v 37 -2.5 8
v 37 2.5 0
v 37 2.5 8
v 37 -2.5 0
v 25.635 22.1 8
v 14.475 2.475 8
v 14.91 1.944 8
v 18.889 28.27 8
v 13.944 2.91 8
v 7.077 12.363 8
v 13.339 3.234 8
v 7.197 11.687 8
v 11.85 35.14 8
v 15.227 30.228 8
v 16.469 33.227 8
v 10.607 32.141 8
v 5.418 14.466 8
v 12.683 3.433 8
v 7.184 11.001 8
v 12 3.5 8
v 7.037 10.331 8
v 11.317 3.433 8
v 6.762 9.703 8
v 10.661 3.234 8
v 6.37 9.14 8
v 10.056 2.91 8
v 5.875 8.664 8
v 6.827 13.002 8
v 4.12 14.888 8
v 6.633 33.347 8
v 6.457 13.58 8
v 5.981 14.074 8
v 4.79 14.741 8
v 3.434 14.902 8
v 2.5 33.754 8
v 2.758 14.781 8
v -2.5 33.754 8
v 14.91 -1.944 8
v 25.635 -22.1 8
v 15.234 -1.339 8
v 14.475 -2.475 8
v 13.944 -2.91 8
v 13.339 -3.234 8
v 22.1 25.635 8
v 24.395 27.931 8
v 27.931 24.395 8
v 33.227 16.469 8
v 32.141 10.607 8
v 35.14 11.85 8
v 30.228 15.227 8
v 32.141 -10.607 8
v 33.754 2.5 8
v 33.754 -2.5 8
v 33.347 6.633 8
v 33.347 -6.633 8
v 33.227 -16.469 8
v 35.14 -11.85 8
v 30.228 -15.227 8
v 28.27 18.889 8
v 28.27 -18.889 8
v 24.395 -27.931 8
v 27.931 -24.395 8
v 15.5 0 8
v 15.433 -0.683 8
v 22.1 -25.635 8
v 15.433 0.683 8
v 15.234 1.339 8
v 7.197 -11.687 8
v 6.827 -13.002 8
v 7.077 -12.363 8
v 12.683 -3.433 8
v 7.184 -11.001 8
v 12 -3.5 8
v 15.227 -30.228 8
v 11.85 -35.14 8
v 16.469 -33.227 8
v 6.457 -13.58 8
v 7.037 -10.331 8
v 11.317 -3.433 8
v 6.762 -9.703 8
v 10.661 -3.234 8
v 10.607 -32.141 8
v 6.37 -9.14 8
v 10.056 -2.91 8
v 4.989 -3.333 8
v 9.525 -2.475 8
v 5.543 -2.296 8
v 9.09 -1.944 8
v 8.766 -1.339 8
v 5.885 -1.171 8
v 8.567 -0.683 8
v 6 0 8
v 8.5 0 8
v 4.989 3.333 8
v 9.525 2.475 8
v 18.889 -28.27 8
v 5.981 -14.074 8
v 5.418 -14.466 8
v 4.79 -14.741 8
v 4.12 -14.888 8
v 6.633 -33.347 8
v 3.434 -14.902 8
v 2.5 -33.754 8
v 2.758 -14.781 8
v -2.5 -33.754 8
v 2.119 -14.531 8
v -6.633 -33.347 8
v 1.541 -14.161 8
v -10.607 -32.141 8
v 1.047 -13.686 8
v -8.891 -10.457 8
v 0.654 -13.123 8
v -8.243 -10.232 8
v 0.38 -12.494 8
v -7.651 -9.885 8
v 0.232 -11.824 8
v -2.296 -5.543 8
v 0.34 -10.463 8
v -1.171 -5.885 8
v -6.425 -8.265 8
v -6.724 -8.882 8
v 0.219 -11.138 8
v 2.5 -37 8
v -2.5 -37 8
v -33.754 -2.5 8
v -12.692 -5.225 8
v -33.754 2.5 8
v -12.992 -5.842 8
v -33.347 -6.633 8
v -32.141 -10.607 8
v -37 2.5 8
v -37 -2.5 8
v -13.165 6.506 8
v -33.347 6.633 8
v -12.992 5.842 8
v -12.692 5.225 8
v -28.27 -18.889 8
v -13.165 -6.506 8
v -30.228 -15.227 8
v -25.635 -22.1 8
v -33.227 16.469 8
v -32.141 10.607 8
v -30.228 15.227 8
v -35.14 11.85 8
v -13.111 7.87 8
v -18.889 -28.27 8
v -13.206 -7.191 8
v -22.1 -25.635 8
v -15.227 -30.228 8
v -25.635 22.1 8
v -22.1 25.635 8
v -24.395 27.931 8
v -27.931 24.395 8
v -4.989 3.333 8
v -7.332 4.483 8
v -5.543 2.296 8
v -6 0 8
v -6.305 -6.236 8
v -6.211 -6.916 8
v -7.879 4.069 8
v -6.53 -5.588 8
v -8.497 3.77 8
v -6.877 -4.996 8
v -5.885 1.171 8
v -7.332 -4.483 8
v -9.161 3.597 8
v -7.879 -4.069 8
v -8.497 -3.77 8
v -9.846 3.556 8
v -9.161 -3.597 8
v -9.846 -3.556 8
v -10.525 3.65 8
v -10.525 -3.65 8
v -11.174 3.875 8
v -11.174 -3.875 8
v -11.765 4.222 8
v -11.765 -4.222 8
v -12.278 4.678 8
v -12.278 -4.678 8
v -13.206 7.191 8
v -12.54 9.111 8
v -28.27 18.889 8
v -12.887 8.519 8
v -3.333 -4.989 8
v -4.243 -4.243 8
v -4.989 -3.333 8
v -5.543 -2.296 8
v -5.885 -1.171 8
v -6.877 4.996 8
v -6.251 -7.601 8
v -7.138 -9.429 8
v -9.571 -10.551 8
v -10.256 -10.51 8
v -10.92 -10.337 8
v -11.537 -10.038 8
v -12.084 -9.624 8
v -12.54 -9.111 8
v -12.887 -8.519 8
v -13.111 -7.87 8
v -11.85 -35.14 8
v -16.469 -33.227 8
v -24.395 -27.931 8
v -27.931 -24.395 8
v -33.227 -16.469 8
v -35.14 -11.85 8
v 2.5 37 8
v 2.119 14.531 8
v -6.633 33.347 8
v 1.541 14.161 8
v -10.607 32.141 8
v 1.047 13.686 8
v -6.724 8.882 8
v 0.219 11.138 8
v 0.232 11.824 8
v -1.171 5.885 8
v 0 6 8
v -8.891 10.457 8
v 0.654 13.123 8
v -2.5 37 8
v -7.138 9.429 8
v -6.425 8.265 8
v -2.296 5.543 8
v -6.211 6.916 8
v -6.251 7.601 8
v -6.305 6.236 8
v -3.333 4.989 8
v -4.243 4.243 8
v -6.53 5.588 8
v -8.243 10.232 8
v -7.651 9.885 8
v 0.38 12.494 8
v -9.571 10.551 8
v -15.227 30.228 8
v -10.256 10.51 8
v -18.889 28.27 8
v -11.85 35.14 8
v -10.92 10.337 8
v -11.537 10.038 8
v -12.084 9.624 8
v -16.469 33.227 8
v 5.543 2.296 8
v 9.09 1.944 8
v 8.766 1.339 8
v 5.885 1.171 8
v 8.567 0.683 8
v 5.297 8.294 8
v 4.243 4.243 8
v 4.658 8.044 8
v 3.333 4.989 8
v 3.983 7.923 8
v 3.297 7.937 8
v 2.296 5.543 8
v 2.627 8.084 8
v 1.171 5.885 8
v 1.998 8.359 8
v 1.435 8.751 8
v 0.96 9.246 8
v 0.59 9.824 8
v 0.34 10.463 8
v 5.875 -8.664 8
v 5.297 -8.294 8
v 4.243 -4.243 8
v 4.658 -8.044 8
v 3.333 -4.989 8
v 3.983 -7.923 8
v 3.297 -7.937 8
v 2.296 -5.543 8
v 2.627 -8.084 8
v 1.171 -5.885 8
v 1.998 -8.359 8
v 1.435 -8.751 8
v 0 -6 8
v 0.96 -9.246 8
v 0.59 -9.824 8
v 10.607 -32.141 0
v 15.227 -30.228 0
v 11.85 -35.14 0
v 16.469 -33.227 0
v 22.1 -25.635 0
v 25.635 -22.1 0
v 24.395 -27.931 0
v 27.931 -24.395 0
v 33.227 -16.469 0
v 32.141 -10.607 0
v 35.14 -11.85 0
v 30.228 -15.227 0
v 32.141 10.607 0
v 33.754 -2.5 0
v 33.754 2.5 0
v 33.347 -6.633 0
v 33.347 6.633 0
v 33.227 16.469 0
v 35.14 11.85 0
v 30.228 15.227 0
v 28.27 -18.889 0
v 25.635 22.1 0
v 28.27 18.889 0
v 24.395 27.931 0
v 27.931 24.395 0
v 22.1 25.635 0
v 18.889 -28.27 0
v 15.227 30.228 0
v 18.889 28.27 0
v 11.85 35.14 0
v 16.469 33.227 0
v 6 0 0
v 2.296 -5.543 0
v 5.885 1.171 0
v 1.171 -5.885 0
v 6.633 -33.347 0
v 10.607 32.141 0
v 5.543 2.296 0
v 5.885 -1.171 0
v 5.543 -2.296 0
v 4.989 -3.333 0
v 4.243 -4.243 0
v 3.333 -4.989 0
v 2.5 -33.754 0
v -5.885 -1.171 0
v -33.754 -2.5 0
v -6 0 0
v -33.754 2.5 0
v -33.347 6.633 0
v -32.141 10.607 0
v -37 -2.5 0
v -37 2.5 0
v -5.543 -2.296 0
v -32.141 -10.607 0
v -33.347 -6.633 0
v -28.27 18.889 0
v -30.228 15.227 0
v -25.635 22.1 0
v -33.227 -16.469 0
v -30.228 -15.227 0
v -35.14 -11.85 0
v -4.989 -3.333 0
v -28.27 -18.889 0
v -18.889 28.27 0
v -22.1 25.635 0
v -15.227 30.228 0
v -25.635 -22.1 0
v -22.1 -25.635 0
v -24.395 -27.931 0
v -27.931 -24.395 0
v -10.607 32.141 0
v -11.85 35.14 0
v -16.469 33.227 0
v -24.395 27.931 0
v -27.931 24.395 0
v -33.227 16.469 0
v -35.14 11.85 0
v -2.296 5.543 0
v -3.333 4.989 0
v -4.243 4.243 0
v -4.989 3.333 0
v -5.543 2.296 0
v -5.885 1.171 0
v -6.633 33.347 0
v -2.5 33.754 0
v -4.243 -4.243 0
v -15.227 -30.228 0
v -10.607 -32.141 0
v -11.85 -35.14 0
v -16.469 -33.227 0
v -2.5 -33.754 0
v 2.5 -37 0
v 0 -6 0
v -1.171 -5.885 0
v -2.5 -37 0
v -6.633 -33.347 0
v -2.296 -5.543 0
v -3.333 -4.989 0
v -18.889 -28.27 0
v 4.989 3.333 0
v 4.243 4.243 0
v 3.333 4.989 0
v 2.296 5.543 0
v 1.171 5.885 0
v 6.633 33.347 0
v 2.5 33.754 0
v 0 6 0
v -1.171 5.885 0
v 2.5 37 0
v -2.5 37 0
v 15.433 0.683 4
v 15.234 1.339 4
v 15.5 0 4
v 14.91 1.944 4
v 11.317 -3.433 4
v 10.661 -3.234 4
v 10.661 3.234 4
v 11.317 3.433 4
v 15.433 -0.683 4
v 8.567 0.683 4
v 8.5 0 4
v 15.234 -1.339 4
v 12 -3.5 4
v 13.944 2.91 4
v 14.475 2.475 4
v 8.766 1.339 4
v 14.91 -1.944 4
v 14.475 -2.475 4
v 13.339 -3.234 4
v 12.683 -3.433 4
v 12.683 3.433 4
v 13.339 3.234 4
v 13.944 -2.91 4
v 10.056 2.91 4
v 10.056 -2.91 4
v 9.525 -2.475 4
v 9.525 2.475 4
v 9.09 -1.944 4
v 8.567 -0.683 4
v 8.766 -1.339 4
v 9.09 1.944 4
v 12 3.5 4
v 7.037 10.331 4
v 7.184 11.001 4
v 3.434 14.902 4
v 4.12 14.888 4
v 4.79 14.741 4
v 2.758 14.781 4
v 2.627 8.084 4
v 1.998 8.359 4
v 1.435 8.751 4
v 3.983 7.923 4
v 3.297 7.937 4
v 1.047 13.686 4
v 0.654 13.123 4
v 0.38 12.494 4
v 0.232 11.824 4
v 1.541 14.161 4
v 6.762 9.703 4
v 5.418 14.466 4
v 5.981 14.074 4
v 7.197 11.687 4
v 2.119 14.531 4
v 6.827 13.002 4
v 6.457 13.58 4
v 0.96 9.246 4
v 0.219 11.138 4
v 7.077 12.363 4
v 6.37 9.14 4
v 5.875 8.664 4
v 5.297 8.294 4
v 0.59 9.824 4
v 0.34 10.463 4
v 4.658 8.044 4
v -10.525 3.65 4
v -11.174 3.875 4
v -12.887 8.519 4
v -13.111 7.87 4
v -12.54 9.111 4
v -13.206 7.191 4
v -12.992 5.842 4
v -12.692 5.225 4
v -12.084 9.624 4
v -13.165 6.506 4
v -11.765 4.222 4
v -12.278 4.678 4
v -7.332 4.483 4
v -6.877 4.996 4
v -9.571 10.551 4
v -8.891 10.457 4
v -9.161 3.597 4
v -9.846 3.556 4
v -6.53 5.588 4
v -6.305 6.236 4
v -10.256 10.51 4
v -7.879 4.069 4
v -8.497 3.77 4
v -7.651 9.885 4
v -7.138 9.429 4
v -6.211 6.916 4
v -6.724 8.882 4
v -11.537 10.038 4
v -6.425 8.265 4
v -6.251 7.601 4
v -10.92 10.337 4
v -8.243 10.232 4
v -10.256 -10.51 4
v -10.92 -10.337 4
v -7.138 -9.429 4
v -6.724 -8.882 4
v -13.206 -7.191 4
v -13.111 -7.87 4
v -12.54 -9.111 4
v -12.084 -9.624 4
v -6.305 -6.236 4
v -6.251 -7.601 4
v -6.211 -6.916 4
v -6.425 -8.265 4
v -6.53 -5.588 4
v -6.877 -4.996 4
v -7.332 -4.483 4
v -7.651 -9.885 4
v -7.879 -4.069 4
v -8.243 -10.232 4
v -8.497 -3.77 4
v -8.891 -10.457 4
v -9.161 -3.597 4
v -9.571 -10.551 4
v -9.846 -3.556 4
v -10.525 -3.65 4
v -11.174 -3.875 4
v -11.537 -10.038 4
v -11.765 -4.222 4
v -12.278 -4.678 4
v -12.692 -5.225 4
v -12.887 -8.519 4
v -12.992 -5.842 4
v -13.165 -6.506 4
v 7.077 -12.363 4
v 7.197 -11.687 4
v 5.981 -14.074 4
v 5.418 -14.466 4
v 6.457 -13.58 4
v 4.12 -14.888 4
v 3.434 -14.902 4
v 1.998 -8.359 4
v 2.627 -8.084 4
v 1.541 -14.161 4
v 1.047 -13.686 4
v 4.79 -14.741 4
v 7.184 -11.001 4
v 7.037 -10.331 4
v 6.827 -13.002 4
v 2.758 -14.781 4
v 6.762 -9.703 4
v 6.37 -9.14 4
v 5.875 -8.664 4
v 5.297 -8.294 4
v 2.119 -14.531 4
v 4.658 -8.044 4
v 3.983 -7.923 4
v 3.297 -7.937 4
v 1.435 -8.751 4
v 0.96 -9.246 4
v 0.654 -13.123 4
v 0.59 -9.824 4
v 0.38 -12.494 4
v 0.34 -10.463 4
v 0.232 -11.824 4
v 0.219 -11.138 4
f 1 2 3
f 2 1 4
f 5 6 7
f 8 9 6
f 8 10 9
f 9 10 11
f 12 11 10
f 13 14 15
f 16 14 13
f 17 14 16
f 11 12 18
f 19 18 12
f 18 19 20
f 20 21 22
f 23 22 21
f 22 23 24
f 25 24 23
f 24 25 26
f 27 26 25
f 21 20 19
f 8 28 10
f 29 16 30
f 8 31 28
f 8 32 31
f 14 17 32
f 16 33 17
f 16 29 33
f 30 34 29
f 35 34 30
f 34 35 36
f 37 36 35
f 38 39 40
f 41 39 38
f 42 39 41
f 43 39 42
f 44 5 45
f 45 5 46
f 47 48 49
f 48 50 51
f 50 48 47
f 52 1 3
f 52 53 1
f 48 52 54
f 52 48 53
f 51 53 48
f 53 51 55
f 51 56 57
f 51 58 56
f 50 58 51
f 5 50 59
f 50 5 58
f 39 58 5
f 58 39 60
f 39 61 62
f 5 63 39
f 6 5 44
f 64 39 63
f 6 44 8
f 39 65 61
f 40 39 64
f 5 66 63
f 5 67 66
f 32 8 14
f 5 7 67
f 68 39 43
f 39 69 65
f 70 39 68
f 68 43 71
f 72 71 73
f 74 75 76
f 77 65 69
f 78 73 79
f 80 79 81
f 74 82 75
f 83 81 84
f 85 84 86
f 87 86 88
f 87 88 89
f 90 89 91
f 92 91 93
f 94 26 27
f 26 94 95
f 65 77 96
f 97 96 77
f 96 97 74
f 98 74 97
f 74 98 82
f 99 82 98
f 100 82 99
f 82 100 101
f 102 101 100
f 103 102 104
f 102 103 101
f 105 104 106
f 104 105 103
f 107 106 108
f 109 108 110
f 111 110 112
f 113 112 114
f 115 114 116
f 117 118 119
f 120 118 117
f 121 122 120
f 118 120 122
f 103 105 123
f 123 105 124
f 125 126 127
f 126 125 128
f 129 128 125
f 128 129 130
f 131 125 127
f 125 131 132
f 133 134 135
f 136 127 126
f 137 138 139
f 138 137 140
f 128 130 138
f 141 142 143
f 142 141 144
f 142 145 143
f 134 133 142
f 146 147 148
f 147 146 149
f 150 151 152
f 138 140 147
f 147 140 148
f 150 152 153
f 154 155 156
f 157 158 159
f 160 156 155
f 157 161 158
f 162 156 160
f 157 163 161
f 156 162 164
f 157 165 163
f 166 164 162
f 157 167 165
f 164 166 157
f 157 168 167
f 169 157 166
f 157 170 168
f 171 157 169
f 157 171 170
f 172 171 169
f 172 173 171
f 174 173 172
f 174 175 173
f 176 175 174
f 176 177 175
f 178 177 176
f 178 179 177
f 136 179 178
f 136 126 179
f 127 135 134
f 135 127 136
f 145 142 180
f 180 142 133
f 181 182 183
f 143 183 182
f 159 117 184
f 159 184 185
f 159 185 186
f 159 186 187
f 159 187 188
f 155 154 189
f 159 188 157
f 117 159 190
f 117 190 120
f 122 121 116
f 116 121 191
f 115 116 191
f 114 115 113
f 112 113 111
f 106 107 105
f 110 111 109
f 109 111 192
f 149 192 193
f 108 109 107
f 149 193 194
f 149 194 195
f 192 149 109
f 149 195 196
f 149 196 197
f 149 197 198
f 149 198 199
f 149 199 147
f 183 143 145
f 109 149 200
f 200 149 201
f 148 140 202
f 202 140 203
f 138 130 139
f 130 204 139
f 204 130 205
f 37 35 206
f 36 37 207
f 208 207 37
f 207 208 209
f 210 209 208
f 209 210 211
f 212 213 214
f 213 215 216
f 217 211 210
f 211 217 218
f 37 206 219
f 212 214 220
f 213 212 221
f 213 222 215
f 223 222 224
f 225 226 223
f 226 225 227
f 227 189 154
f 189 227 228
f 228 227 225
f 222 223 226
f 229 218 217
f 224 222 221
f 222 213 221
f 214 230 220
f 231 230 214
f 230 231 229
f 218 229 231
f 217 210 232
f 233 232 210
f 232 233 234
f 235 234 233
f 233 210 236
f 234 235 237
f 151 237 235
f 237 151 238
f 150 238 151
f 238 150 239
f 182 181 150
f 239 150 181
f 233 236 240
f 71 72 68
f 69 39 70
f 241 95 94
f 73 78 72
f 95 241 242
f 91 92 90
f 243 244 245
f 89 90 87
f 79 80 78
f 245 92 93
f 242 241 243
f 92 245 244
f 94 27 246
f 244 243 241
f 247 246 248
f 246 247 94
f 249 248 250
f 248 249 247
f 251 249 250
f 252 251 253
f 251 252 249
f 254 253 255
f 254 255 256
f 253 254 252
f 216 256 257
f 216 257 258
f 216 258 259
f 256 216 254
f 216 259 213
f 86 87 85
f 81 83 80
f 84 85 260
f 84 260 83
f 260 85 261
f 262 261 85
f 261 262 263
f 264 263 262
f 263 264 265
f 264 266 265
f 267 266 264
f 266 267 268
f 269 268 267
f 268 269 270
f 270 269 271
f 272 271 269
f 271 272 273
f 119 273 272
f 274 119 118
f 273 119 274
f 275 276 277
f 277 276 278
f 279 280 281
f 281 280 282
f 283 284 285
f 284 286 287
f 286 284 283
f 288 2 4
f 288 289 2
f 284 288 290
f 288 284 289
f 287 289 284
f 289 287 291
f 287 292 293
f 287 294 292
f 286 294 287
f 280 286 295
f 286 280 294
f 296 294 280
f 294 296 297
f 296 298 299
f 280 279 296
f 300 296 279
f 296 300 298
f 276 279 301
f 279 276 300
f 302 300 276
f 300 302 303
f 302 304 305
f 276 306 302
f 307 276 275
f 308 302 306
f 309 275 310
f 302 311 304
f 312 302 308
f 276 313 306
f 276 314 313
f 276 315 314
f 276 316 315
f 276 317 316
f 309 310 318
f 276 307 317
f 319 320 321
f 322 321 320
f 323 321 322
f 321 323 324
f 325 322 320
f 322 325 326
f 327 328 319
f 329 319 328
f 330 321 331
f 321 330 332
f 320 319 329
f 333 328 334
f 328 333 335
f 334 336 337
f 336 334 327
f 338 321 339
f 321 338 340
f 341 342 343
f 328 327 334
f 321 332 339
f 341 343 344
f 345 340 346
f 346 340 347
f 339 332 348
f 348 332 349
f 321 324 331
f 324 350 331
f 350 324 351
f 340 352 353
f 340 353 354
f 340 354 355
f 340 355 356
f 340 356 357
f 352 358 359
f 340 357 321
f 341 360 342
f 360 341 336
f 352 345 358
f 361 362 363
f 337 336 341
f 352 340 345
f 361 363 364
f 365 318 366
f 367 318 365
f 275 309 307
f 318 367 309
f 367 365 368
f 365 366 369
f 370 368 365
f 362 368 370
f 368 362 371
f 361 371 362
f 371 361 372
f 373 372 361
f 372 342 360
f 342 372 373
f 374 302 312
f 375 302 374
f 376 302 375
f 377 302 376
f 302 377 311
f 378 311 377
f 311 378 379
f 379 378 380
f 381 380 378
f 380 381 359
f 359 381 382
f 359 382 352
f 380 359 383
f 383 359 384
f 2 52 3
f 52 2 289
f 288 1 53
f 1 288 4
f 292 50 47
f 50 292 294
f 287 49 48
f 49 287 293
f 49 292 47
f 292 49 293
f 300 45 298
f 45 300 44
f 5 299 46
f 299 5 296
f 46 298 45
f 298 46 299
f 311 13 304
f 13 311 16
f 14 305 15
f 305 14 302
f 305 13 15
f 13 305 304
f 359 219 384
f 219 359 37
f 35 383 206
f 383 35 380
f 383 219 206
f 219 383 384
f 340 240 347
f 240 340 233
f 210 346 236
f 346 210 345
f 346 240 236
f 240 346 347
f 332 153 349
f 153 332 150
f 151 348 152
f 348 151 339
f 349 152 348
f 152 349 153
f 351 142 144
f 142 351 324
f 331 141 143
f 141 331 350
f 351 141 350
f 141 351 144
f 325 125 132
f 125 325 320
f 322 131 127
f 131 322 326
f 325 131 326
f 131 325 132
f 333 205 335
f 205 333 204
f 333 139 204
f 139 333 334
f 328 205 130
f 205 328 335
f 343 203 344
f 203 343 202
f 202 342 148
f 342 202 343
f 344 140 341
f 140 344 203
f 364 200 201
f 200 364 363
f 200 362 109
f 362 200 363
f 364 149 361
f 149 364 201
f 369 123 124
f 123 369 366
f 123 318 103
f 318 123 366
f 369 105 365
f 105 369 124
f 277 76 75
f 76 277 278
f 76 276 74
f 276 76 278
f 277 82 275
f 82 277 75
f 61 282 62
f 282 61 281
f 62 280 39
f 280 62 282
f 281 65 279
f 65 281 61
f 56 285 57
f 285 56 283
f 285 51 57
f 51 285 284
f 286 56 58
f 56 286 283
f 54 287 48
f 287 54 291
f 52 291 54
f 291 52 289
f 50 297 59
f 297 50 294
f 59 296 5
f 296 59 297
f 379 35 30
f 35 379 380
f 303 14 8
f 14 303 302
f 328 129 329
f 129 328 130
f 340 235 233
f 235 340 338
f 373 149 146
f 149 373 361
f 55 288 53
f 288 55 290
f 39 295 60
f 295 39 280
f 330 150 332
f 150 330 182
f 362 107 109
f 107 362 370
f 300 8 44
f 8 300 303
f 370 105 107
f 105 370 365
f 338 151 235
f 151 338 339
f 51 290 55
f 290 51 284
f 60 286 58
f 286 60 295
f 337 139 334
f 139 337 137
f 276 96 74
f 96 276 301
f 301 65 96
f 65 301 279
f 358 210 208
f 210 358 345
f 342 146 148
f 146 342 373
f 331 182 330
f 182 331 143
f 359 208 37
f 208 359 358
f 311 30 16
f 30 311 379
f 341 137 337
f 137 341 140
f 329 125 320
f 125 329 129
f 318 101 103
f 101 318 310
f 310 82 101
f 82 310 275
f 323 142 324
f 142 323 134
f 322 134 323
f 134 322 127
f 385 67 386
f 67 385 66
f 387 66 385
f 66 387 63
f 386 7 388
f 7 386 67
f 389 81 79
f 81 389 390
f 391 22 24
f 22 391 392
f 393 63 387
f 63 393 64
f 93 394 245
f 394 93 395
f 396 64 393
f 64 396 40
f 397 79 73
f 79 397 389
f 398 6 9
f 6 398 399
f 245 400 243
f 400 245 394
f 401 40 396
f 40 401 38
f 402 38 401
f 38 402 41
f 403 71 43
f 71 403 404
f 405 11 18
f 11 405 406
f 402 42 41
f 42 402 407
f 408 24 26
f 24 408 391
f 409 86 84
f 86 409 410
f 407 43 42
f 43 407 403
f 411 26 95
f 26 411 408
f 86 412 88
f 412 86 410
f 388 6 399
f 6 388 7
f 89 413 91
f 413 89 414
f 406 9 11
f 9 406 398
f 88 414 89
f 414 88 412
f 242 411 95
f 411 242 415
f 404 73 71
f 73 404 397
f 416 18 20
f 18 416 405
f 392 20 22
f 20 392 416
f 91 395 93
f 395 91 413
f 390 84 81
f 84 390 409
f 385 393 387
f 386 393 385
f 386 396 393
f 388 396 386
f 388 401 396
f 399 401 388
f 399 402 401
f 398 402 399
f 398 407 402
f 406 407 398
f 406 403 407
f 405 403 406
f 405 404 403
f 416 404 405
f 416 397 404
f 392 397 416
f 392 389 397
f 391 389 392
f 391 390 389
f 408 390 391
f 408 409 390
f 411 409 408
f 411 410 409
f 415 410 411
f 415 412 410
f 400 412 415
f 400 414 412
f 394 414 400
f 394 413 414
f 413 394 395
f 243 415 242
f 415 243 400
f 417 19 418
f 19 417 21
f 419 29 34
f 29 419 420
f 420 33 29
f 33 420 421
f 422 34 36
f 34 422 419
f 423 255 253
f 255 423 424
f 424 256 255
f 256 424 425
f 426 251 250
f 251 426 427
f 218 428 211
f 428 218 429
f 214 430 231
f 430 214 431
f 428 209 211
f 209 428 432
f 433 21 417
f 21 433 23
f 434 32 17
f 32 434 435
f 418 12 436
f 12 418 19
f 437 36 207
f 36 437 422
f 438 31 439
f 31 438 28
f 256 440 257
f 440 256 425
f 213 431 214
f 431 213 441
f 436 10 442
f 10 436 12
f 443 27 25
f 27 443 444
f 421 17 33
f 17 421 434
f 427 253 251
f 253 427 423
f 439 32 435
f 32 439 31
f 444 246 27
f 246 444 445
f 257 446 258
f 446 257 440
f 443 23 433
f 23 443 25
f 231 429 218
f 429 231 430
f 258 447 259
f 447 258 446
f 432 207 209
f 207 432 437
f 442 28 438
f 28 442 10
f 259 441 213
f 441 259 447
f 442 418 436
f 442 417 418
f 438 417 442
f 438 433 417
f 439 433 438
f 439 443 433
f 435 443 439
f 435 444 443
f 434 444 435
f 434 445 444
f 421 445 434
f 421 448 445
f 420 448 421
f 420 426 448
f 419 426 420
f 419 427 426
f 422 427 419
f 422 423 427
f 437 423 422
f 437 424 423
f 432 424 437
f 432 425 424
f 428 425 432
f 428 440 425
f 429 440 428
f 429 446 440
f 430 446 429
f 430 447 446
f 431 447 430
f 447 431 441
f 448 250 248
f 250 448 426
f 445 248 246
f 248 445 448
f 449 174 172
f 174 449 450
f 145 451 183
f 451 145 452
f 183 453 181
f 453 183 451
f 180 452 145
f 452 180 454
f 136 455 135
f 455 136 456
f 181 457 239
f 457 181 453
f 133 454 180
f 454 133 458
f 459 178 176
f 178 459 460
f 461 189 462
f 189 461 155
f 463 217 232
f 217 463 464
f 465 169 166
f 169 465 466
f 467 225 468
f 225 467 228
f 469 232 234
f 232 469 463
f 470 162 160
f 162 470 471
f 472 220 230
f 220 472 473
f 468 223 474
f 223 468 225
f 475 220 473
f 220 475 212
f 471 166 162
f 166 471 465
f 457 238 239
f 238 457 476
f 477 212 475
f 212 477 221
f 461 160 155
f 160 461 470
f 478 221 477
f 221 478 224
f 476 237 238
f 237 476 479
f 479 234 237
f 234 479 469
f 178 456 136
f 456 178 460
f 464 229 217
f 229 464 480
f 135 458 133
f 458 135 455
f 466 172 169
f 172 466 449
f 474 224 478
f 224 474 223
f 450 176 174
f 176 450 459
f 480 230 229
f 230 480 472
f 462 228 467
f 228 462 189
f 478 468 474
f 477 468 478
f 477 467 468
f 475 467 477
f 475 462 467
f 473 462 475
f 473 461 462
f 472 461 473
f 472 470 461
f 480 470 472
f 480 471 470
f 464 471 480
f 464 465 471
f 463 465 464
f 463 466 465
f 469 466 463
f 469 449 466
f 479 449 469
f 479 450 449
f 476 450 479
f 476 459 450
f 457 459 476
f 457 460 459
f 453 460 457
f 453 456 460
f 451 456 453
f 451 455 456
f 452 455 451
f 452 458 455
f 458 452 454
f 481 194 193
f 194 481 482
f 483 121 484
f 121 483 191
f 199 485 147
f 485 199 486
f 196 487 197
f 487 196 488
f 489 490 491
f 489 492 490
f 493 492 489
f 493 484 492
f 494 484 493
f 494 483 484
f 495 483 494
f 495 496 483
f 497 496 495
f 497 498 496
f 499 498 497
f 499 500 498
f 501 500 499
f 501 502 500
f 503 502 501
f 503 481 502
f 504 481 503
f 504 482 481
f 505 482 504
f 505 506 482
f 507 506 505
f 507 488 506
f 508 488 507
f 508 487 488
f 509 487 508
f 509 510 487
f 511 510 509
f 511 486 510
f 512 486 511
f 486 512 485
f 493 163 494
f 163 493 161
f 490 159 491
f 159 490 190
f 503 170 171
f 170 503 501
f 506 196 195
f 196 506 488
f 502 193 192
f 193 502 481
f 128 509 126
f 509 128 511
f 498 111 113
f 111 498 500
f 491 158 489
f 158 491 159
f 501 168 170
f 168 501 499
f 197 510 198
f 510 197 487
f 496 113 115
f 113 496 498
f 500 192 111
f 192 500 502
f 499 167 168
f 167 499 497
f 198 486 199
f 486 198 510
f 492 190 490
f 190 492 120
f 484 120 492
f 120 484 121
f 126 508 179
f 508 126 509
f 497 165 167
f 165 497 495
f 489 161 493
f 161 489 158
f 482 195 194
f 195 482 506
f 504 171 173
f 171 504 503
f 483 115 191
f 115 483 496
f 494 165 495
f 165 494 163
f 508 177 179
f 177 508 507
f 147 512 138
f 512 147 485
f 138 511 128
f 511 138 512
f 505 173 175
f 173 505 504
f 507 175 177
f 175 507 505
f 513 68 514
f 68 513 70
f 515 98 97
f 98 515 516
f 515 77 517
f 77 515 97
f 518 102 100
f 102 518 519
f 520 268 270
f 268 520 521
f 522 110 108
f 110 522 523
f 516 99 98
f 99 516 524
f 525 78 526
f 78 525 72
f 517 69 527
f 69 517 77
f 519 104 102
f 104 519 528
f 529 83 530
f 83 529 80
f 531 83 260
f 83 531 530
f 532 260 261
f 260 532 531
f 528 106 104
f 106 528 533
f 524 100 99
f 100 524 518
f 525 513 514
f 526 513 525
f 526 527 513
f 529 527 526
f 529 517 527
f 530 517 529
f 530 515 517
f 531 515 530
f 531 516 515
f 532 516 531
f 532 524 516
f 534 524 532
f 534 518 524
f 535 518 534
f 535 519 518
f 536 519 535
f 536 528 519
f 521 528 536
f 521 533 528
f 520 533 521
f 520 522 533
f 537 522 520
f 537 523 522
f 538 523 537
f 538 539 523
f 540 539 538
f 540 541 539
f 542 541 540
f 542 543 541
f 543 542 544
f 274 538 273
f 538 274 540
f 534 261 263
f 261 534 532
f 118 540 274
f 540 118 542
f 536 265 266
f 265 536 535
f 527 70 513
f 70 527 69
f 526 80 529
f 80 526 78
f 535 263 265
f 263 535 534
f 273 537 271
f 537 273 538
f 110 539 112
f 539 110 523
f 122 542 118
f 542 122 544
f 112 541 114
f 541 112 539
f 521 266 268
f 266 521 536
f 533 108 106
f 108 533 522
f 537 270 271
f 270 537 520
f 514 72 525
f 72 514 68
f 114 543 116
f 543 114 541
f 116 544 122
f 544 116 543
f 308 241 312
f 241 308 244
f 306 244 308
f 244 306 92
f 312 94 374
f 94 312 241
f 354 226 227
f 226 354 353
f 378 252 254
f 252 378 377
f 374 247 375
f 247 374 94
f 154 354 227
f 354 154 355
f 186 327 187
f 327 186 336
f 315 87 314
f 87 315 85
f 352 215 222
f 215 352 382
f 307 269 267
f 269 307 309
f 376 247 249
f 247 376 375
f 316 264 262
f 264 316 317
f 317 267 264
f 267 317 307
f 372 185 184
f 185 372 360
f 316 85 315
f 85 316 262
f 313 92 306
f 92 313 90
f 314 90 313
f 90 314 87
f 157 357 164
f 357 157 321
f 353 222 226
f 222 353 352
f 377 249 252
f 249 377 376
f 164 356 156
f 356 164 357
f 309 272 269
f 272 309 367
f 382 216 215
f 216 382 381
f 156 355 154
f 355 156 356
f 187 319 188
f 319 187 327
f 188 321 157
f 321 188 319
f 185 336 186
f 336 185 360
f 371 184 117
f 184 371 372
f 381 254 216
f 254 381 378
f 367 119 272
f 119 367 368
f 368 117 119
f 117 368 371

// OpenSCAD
$fn = 32;

// ----------------------------------------------------------------------
// Spur blank: lightened gear blank
// ----------------------------------------------------------------------

// --- parameters (mm) ---
disc_r = 34;              // blank root radius
disc_t = 8;               // blank thickness
n_teeth = 16;             // stub tooth count
tooth_w = 5;              // tooth width at the root
tooth_h = 3;              // tooth height above the root
bore_r = 6;               // central bore radius
ring_r = 12;              // lightening pocket ring radius
pocket_r = 3.5;           // lightening pocket radius

out_r = disc_r + tooth_h;  // tip radius
bbox_x = 74.0;  // measured width over the teeth
bbox_y = 74.0;  // measured depth over the teeth

difference() {
union() {
  cylinder(r = disc_r, h = disc_t);
  for (i = [0 : n_teeth - 1])
    rotate([0, 0, i * 360 / n_teeth])
      translate([disc_r - 1, -tooth_w / 2, 0])
        cube([tooth_h + 1, tooth_w, disc_t]);
}
  translate([0, 0, -1]) cylinder(r = bore_r, h = disc_t + 2);
  for (i = [0 : 5])
    rotate([0, 0, i * 72])
      translate([ring_r, 0, disc_t - 4])
        cylinder(r = pocket_r, h = 5);
}
